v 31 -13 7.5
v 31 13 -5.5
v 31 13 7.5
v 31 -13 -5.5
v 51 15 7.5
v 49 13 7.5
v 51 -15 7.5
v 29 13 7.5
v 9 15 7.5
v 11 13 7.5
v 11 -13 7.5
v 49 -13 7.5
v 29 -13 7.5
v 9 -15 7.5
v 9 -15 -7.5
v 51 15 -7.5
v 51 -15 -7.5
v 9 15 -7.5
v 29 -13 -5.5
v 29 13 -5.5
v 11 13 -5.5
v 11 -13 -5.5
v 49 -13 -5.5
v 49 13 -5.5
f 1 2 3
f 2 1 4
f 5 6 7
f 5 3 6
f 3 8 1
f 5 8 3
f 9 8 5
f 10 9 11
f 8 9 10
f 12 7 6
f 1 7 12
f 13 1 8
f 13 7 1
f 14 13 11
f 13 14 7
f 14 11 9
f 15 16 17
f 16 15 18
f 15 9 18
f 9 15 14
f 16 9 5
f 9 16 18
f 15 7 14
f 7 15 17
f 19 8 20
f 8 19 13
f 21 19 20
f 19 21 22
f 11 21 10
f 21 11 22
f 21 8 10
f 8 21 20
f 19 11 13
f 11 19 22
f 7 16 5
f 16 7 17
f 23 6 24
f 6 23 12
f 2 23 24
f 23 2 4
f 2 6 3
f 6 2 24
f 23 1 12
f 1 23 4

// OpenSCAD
Number_of_slots = 2;
height = 15;
for (i = [1 : abs(1) : Number_of_slots]) {
  translate([(i * 20), 0, 0]){
    difference() {
      cube([22, 30, height], center=true);

      translate([0, 0, 2]){
        cube([18, 26, height], center=true);
      }
    }
  }
}
